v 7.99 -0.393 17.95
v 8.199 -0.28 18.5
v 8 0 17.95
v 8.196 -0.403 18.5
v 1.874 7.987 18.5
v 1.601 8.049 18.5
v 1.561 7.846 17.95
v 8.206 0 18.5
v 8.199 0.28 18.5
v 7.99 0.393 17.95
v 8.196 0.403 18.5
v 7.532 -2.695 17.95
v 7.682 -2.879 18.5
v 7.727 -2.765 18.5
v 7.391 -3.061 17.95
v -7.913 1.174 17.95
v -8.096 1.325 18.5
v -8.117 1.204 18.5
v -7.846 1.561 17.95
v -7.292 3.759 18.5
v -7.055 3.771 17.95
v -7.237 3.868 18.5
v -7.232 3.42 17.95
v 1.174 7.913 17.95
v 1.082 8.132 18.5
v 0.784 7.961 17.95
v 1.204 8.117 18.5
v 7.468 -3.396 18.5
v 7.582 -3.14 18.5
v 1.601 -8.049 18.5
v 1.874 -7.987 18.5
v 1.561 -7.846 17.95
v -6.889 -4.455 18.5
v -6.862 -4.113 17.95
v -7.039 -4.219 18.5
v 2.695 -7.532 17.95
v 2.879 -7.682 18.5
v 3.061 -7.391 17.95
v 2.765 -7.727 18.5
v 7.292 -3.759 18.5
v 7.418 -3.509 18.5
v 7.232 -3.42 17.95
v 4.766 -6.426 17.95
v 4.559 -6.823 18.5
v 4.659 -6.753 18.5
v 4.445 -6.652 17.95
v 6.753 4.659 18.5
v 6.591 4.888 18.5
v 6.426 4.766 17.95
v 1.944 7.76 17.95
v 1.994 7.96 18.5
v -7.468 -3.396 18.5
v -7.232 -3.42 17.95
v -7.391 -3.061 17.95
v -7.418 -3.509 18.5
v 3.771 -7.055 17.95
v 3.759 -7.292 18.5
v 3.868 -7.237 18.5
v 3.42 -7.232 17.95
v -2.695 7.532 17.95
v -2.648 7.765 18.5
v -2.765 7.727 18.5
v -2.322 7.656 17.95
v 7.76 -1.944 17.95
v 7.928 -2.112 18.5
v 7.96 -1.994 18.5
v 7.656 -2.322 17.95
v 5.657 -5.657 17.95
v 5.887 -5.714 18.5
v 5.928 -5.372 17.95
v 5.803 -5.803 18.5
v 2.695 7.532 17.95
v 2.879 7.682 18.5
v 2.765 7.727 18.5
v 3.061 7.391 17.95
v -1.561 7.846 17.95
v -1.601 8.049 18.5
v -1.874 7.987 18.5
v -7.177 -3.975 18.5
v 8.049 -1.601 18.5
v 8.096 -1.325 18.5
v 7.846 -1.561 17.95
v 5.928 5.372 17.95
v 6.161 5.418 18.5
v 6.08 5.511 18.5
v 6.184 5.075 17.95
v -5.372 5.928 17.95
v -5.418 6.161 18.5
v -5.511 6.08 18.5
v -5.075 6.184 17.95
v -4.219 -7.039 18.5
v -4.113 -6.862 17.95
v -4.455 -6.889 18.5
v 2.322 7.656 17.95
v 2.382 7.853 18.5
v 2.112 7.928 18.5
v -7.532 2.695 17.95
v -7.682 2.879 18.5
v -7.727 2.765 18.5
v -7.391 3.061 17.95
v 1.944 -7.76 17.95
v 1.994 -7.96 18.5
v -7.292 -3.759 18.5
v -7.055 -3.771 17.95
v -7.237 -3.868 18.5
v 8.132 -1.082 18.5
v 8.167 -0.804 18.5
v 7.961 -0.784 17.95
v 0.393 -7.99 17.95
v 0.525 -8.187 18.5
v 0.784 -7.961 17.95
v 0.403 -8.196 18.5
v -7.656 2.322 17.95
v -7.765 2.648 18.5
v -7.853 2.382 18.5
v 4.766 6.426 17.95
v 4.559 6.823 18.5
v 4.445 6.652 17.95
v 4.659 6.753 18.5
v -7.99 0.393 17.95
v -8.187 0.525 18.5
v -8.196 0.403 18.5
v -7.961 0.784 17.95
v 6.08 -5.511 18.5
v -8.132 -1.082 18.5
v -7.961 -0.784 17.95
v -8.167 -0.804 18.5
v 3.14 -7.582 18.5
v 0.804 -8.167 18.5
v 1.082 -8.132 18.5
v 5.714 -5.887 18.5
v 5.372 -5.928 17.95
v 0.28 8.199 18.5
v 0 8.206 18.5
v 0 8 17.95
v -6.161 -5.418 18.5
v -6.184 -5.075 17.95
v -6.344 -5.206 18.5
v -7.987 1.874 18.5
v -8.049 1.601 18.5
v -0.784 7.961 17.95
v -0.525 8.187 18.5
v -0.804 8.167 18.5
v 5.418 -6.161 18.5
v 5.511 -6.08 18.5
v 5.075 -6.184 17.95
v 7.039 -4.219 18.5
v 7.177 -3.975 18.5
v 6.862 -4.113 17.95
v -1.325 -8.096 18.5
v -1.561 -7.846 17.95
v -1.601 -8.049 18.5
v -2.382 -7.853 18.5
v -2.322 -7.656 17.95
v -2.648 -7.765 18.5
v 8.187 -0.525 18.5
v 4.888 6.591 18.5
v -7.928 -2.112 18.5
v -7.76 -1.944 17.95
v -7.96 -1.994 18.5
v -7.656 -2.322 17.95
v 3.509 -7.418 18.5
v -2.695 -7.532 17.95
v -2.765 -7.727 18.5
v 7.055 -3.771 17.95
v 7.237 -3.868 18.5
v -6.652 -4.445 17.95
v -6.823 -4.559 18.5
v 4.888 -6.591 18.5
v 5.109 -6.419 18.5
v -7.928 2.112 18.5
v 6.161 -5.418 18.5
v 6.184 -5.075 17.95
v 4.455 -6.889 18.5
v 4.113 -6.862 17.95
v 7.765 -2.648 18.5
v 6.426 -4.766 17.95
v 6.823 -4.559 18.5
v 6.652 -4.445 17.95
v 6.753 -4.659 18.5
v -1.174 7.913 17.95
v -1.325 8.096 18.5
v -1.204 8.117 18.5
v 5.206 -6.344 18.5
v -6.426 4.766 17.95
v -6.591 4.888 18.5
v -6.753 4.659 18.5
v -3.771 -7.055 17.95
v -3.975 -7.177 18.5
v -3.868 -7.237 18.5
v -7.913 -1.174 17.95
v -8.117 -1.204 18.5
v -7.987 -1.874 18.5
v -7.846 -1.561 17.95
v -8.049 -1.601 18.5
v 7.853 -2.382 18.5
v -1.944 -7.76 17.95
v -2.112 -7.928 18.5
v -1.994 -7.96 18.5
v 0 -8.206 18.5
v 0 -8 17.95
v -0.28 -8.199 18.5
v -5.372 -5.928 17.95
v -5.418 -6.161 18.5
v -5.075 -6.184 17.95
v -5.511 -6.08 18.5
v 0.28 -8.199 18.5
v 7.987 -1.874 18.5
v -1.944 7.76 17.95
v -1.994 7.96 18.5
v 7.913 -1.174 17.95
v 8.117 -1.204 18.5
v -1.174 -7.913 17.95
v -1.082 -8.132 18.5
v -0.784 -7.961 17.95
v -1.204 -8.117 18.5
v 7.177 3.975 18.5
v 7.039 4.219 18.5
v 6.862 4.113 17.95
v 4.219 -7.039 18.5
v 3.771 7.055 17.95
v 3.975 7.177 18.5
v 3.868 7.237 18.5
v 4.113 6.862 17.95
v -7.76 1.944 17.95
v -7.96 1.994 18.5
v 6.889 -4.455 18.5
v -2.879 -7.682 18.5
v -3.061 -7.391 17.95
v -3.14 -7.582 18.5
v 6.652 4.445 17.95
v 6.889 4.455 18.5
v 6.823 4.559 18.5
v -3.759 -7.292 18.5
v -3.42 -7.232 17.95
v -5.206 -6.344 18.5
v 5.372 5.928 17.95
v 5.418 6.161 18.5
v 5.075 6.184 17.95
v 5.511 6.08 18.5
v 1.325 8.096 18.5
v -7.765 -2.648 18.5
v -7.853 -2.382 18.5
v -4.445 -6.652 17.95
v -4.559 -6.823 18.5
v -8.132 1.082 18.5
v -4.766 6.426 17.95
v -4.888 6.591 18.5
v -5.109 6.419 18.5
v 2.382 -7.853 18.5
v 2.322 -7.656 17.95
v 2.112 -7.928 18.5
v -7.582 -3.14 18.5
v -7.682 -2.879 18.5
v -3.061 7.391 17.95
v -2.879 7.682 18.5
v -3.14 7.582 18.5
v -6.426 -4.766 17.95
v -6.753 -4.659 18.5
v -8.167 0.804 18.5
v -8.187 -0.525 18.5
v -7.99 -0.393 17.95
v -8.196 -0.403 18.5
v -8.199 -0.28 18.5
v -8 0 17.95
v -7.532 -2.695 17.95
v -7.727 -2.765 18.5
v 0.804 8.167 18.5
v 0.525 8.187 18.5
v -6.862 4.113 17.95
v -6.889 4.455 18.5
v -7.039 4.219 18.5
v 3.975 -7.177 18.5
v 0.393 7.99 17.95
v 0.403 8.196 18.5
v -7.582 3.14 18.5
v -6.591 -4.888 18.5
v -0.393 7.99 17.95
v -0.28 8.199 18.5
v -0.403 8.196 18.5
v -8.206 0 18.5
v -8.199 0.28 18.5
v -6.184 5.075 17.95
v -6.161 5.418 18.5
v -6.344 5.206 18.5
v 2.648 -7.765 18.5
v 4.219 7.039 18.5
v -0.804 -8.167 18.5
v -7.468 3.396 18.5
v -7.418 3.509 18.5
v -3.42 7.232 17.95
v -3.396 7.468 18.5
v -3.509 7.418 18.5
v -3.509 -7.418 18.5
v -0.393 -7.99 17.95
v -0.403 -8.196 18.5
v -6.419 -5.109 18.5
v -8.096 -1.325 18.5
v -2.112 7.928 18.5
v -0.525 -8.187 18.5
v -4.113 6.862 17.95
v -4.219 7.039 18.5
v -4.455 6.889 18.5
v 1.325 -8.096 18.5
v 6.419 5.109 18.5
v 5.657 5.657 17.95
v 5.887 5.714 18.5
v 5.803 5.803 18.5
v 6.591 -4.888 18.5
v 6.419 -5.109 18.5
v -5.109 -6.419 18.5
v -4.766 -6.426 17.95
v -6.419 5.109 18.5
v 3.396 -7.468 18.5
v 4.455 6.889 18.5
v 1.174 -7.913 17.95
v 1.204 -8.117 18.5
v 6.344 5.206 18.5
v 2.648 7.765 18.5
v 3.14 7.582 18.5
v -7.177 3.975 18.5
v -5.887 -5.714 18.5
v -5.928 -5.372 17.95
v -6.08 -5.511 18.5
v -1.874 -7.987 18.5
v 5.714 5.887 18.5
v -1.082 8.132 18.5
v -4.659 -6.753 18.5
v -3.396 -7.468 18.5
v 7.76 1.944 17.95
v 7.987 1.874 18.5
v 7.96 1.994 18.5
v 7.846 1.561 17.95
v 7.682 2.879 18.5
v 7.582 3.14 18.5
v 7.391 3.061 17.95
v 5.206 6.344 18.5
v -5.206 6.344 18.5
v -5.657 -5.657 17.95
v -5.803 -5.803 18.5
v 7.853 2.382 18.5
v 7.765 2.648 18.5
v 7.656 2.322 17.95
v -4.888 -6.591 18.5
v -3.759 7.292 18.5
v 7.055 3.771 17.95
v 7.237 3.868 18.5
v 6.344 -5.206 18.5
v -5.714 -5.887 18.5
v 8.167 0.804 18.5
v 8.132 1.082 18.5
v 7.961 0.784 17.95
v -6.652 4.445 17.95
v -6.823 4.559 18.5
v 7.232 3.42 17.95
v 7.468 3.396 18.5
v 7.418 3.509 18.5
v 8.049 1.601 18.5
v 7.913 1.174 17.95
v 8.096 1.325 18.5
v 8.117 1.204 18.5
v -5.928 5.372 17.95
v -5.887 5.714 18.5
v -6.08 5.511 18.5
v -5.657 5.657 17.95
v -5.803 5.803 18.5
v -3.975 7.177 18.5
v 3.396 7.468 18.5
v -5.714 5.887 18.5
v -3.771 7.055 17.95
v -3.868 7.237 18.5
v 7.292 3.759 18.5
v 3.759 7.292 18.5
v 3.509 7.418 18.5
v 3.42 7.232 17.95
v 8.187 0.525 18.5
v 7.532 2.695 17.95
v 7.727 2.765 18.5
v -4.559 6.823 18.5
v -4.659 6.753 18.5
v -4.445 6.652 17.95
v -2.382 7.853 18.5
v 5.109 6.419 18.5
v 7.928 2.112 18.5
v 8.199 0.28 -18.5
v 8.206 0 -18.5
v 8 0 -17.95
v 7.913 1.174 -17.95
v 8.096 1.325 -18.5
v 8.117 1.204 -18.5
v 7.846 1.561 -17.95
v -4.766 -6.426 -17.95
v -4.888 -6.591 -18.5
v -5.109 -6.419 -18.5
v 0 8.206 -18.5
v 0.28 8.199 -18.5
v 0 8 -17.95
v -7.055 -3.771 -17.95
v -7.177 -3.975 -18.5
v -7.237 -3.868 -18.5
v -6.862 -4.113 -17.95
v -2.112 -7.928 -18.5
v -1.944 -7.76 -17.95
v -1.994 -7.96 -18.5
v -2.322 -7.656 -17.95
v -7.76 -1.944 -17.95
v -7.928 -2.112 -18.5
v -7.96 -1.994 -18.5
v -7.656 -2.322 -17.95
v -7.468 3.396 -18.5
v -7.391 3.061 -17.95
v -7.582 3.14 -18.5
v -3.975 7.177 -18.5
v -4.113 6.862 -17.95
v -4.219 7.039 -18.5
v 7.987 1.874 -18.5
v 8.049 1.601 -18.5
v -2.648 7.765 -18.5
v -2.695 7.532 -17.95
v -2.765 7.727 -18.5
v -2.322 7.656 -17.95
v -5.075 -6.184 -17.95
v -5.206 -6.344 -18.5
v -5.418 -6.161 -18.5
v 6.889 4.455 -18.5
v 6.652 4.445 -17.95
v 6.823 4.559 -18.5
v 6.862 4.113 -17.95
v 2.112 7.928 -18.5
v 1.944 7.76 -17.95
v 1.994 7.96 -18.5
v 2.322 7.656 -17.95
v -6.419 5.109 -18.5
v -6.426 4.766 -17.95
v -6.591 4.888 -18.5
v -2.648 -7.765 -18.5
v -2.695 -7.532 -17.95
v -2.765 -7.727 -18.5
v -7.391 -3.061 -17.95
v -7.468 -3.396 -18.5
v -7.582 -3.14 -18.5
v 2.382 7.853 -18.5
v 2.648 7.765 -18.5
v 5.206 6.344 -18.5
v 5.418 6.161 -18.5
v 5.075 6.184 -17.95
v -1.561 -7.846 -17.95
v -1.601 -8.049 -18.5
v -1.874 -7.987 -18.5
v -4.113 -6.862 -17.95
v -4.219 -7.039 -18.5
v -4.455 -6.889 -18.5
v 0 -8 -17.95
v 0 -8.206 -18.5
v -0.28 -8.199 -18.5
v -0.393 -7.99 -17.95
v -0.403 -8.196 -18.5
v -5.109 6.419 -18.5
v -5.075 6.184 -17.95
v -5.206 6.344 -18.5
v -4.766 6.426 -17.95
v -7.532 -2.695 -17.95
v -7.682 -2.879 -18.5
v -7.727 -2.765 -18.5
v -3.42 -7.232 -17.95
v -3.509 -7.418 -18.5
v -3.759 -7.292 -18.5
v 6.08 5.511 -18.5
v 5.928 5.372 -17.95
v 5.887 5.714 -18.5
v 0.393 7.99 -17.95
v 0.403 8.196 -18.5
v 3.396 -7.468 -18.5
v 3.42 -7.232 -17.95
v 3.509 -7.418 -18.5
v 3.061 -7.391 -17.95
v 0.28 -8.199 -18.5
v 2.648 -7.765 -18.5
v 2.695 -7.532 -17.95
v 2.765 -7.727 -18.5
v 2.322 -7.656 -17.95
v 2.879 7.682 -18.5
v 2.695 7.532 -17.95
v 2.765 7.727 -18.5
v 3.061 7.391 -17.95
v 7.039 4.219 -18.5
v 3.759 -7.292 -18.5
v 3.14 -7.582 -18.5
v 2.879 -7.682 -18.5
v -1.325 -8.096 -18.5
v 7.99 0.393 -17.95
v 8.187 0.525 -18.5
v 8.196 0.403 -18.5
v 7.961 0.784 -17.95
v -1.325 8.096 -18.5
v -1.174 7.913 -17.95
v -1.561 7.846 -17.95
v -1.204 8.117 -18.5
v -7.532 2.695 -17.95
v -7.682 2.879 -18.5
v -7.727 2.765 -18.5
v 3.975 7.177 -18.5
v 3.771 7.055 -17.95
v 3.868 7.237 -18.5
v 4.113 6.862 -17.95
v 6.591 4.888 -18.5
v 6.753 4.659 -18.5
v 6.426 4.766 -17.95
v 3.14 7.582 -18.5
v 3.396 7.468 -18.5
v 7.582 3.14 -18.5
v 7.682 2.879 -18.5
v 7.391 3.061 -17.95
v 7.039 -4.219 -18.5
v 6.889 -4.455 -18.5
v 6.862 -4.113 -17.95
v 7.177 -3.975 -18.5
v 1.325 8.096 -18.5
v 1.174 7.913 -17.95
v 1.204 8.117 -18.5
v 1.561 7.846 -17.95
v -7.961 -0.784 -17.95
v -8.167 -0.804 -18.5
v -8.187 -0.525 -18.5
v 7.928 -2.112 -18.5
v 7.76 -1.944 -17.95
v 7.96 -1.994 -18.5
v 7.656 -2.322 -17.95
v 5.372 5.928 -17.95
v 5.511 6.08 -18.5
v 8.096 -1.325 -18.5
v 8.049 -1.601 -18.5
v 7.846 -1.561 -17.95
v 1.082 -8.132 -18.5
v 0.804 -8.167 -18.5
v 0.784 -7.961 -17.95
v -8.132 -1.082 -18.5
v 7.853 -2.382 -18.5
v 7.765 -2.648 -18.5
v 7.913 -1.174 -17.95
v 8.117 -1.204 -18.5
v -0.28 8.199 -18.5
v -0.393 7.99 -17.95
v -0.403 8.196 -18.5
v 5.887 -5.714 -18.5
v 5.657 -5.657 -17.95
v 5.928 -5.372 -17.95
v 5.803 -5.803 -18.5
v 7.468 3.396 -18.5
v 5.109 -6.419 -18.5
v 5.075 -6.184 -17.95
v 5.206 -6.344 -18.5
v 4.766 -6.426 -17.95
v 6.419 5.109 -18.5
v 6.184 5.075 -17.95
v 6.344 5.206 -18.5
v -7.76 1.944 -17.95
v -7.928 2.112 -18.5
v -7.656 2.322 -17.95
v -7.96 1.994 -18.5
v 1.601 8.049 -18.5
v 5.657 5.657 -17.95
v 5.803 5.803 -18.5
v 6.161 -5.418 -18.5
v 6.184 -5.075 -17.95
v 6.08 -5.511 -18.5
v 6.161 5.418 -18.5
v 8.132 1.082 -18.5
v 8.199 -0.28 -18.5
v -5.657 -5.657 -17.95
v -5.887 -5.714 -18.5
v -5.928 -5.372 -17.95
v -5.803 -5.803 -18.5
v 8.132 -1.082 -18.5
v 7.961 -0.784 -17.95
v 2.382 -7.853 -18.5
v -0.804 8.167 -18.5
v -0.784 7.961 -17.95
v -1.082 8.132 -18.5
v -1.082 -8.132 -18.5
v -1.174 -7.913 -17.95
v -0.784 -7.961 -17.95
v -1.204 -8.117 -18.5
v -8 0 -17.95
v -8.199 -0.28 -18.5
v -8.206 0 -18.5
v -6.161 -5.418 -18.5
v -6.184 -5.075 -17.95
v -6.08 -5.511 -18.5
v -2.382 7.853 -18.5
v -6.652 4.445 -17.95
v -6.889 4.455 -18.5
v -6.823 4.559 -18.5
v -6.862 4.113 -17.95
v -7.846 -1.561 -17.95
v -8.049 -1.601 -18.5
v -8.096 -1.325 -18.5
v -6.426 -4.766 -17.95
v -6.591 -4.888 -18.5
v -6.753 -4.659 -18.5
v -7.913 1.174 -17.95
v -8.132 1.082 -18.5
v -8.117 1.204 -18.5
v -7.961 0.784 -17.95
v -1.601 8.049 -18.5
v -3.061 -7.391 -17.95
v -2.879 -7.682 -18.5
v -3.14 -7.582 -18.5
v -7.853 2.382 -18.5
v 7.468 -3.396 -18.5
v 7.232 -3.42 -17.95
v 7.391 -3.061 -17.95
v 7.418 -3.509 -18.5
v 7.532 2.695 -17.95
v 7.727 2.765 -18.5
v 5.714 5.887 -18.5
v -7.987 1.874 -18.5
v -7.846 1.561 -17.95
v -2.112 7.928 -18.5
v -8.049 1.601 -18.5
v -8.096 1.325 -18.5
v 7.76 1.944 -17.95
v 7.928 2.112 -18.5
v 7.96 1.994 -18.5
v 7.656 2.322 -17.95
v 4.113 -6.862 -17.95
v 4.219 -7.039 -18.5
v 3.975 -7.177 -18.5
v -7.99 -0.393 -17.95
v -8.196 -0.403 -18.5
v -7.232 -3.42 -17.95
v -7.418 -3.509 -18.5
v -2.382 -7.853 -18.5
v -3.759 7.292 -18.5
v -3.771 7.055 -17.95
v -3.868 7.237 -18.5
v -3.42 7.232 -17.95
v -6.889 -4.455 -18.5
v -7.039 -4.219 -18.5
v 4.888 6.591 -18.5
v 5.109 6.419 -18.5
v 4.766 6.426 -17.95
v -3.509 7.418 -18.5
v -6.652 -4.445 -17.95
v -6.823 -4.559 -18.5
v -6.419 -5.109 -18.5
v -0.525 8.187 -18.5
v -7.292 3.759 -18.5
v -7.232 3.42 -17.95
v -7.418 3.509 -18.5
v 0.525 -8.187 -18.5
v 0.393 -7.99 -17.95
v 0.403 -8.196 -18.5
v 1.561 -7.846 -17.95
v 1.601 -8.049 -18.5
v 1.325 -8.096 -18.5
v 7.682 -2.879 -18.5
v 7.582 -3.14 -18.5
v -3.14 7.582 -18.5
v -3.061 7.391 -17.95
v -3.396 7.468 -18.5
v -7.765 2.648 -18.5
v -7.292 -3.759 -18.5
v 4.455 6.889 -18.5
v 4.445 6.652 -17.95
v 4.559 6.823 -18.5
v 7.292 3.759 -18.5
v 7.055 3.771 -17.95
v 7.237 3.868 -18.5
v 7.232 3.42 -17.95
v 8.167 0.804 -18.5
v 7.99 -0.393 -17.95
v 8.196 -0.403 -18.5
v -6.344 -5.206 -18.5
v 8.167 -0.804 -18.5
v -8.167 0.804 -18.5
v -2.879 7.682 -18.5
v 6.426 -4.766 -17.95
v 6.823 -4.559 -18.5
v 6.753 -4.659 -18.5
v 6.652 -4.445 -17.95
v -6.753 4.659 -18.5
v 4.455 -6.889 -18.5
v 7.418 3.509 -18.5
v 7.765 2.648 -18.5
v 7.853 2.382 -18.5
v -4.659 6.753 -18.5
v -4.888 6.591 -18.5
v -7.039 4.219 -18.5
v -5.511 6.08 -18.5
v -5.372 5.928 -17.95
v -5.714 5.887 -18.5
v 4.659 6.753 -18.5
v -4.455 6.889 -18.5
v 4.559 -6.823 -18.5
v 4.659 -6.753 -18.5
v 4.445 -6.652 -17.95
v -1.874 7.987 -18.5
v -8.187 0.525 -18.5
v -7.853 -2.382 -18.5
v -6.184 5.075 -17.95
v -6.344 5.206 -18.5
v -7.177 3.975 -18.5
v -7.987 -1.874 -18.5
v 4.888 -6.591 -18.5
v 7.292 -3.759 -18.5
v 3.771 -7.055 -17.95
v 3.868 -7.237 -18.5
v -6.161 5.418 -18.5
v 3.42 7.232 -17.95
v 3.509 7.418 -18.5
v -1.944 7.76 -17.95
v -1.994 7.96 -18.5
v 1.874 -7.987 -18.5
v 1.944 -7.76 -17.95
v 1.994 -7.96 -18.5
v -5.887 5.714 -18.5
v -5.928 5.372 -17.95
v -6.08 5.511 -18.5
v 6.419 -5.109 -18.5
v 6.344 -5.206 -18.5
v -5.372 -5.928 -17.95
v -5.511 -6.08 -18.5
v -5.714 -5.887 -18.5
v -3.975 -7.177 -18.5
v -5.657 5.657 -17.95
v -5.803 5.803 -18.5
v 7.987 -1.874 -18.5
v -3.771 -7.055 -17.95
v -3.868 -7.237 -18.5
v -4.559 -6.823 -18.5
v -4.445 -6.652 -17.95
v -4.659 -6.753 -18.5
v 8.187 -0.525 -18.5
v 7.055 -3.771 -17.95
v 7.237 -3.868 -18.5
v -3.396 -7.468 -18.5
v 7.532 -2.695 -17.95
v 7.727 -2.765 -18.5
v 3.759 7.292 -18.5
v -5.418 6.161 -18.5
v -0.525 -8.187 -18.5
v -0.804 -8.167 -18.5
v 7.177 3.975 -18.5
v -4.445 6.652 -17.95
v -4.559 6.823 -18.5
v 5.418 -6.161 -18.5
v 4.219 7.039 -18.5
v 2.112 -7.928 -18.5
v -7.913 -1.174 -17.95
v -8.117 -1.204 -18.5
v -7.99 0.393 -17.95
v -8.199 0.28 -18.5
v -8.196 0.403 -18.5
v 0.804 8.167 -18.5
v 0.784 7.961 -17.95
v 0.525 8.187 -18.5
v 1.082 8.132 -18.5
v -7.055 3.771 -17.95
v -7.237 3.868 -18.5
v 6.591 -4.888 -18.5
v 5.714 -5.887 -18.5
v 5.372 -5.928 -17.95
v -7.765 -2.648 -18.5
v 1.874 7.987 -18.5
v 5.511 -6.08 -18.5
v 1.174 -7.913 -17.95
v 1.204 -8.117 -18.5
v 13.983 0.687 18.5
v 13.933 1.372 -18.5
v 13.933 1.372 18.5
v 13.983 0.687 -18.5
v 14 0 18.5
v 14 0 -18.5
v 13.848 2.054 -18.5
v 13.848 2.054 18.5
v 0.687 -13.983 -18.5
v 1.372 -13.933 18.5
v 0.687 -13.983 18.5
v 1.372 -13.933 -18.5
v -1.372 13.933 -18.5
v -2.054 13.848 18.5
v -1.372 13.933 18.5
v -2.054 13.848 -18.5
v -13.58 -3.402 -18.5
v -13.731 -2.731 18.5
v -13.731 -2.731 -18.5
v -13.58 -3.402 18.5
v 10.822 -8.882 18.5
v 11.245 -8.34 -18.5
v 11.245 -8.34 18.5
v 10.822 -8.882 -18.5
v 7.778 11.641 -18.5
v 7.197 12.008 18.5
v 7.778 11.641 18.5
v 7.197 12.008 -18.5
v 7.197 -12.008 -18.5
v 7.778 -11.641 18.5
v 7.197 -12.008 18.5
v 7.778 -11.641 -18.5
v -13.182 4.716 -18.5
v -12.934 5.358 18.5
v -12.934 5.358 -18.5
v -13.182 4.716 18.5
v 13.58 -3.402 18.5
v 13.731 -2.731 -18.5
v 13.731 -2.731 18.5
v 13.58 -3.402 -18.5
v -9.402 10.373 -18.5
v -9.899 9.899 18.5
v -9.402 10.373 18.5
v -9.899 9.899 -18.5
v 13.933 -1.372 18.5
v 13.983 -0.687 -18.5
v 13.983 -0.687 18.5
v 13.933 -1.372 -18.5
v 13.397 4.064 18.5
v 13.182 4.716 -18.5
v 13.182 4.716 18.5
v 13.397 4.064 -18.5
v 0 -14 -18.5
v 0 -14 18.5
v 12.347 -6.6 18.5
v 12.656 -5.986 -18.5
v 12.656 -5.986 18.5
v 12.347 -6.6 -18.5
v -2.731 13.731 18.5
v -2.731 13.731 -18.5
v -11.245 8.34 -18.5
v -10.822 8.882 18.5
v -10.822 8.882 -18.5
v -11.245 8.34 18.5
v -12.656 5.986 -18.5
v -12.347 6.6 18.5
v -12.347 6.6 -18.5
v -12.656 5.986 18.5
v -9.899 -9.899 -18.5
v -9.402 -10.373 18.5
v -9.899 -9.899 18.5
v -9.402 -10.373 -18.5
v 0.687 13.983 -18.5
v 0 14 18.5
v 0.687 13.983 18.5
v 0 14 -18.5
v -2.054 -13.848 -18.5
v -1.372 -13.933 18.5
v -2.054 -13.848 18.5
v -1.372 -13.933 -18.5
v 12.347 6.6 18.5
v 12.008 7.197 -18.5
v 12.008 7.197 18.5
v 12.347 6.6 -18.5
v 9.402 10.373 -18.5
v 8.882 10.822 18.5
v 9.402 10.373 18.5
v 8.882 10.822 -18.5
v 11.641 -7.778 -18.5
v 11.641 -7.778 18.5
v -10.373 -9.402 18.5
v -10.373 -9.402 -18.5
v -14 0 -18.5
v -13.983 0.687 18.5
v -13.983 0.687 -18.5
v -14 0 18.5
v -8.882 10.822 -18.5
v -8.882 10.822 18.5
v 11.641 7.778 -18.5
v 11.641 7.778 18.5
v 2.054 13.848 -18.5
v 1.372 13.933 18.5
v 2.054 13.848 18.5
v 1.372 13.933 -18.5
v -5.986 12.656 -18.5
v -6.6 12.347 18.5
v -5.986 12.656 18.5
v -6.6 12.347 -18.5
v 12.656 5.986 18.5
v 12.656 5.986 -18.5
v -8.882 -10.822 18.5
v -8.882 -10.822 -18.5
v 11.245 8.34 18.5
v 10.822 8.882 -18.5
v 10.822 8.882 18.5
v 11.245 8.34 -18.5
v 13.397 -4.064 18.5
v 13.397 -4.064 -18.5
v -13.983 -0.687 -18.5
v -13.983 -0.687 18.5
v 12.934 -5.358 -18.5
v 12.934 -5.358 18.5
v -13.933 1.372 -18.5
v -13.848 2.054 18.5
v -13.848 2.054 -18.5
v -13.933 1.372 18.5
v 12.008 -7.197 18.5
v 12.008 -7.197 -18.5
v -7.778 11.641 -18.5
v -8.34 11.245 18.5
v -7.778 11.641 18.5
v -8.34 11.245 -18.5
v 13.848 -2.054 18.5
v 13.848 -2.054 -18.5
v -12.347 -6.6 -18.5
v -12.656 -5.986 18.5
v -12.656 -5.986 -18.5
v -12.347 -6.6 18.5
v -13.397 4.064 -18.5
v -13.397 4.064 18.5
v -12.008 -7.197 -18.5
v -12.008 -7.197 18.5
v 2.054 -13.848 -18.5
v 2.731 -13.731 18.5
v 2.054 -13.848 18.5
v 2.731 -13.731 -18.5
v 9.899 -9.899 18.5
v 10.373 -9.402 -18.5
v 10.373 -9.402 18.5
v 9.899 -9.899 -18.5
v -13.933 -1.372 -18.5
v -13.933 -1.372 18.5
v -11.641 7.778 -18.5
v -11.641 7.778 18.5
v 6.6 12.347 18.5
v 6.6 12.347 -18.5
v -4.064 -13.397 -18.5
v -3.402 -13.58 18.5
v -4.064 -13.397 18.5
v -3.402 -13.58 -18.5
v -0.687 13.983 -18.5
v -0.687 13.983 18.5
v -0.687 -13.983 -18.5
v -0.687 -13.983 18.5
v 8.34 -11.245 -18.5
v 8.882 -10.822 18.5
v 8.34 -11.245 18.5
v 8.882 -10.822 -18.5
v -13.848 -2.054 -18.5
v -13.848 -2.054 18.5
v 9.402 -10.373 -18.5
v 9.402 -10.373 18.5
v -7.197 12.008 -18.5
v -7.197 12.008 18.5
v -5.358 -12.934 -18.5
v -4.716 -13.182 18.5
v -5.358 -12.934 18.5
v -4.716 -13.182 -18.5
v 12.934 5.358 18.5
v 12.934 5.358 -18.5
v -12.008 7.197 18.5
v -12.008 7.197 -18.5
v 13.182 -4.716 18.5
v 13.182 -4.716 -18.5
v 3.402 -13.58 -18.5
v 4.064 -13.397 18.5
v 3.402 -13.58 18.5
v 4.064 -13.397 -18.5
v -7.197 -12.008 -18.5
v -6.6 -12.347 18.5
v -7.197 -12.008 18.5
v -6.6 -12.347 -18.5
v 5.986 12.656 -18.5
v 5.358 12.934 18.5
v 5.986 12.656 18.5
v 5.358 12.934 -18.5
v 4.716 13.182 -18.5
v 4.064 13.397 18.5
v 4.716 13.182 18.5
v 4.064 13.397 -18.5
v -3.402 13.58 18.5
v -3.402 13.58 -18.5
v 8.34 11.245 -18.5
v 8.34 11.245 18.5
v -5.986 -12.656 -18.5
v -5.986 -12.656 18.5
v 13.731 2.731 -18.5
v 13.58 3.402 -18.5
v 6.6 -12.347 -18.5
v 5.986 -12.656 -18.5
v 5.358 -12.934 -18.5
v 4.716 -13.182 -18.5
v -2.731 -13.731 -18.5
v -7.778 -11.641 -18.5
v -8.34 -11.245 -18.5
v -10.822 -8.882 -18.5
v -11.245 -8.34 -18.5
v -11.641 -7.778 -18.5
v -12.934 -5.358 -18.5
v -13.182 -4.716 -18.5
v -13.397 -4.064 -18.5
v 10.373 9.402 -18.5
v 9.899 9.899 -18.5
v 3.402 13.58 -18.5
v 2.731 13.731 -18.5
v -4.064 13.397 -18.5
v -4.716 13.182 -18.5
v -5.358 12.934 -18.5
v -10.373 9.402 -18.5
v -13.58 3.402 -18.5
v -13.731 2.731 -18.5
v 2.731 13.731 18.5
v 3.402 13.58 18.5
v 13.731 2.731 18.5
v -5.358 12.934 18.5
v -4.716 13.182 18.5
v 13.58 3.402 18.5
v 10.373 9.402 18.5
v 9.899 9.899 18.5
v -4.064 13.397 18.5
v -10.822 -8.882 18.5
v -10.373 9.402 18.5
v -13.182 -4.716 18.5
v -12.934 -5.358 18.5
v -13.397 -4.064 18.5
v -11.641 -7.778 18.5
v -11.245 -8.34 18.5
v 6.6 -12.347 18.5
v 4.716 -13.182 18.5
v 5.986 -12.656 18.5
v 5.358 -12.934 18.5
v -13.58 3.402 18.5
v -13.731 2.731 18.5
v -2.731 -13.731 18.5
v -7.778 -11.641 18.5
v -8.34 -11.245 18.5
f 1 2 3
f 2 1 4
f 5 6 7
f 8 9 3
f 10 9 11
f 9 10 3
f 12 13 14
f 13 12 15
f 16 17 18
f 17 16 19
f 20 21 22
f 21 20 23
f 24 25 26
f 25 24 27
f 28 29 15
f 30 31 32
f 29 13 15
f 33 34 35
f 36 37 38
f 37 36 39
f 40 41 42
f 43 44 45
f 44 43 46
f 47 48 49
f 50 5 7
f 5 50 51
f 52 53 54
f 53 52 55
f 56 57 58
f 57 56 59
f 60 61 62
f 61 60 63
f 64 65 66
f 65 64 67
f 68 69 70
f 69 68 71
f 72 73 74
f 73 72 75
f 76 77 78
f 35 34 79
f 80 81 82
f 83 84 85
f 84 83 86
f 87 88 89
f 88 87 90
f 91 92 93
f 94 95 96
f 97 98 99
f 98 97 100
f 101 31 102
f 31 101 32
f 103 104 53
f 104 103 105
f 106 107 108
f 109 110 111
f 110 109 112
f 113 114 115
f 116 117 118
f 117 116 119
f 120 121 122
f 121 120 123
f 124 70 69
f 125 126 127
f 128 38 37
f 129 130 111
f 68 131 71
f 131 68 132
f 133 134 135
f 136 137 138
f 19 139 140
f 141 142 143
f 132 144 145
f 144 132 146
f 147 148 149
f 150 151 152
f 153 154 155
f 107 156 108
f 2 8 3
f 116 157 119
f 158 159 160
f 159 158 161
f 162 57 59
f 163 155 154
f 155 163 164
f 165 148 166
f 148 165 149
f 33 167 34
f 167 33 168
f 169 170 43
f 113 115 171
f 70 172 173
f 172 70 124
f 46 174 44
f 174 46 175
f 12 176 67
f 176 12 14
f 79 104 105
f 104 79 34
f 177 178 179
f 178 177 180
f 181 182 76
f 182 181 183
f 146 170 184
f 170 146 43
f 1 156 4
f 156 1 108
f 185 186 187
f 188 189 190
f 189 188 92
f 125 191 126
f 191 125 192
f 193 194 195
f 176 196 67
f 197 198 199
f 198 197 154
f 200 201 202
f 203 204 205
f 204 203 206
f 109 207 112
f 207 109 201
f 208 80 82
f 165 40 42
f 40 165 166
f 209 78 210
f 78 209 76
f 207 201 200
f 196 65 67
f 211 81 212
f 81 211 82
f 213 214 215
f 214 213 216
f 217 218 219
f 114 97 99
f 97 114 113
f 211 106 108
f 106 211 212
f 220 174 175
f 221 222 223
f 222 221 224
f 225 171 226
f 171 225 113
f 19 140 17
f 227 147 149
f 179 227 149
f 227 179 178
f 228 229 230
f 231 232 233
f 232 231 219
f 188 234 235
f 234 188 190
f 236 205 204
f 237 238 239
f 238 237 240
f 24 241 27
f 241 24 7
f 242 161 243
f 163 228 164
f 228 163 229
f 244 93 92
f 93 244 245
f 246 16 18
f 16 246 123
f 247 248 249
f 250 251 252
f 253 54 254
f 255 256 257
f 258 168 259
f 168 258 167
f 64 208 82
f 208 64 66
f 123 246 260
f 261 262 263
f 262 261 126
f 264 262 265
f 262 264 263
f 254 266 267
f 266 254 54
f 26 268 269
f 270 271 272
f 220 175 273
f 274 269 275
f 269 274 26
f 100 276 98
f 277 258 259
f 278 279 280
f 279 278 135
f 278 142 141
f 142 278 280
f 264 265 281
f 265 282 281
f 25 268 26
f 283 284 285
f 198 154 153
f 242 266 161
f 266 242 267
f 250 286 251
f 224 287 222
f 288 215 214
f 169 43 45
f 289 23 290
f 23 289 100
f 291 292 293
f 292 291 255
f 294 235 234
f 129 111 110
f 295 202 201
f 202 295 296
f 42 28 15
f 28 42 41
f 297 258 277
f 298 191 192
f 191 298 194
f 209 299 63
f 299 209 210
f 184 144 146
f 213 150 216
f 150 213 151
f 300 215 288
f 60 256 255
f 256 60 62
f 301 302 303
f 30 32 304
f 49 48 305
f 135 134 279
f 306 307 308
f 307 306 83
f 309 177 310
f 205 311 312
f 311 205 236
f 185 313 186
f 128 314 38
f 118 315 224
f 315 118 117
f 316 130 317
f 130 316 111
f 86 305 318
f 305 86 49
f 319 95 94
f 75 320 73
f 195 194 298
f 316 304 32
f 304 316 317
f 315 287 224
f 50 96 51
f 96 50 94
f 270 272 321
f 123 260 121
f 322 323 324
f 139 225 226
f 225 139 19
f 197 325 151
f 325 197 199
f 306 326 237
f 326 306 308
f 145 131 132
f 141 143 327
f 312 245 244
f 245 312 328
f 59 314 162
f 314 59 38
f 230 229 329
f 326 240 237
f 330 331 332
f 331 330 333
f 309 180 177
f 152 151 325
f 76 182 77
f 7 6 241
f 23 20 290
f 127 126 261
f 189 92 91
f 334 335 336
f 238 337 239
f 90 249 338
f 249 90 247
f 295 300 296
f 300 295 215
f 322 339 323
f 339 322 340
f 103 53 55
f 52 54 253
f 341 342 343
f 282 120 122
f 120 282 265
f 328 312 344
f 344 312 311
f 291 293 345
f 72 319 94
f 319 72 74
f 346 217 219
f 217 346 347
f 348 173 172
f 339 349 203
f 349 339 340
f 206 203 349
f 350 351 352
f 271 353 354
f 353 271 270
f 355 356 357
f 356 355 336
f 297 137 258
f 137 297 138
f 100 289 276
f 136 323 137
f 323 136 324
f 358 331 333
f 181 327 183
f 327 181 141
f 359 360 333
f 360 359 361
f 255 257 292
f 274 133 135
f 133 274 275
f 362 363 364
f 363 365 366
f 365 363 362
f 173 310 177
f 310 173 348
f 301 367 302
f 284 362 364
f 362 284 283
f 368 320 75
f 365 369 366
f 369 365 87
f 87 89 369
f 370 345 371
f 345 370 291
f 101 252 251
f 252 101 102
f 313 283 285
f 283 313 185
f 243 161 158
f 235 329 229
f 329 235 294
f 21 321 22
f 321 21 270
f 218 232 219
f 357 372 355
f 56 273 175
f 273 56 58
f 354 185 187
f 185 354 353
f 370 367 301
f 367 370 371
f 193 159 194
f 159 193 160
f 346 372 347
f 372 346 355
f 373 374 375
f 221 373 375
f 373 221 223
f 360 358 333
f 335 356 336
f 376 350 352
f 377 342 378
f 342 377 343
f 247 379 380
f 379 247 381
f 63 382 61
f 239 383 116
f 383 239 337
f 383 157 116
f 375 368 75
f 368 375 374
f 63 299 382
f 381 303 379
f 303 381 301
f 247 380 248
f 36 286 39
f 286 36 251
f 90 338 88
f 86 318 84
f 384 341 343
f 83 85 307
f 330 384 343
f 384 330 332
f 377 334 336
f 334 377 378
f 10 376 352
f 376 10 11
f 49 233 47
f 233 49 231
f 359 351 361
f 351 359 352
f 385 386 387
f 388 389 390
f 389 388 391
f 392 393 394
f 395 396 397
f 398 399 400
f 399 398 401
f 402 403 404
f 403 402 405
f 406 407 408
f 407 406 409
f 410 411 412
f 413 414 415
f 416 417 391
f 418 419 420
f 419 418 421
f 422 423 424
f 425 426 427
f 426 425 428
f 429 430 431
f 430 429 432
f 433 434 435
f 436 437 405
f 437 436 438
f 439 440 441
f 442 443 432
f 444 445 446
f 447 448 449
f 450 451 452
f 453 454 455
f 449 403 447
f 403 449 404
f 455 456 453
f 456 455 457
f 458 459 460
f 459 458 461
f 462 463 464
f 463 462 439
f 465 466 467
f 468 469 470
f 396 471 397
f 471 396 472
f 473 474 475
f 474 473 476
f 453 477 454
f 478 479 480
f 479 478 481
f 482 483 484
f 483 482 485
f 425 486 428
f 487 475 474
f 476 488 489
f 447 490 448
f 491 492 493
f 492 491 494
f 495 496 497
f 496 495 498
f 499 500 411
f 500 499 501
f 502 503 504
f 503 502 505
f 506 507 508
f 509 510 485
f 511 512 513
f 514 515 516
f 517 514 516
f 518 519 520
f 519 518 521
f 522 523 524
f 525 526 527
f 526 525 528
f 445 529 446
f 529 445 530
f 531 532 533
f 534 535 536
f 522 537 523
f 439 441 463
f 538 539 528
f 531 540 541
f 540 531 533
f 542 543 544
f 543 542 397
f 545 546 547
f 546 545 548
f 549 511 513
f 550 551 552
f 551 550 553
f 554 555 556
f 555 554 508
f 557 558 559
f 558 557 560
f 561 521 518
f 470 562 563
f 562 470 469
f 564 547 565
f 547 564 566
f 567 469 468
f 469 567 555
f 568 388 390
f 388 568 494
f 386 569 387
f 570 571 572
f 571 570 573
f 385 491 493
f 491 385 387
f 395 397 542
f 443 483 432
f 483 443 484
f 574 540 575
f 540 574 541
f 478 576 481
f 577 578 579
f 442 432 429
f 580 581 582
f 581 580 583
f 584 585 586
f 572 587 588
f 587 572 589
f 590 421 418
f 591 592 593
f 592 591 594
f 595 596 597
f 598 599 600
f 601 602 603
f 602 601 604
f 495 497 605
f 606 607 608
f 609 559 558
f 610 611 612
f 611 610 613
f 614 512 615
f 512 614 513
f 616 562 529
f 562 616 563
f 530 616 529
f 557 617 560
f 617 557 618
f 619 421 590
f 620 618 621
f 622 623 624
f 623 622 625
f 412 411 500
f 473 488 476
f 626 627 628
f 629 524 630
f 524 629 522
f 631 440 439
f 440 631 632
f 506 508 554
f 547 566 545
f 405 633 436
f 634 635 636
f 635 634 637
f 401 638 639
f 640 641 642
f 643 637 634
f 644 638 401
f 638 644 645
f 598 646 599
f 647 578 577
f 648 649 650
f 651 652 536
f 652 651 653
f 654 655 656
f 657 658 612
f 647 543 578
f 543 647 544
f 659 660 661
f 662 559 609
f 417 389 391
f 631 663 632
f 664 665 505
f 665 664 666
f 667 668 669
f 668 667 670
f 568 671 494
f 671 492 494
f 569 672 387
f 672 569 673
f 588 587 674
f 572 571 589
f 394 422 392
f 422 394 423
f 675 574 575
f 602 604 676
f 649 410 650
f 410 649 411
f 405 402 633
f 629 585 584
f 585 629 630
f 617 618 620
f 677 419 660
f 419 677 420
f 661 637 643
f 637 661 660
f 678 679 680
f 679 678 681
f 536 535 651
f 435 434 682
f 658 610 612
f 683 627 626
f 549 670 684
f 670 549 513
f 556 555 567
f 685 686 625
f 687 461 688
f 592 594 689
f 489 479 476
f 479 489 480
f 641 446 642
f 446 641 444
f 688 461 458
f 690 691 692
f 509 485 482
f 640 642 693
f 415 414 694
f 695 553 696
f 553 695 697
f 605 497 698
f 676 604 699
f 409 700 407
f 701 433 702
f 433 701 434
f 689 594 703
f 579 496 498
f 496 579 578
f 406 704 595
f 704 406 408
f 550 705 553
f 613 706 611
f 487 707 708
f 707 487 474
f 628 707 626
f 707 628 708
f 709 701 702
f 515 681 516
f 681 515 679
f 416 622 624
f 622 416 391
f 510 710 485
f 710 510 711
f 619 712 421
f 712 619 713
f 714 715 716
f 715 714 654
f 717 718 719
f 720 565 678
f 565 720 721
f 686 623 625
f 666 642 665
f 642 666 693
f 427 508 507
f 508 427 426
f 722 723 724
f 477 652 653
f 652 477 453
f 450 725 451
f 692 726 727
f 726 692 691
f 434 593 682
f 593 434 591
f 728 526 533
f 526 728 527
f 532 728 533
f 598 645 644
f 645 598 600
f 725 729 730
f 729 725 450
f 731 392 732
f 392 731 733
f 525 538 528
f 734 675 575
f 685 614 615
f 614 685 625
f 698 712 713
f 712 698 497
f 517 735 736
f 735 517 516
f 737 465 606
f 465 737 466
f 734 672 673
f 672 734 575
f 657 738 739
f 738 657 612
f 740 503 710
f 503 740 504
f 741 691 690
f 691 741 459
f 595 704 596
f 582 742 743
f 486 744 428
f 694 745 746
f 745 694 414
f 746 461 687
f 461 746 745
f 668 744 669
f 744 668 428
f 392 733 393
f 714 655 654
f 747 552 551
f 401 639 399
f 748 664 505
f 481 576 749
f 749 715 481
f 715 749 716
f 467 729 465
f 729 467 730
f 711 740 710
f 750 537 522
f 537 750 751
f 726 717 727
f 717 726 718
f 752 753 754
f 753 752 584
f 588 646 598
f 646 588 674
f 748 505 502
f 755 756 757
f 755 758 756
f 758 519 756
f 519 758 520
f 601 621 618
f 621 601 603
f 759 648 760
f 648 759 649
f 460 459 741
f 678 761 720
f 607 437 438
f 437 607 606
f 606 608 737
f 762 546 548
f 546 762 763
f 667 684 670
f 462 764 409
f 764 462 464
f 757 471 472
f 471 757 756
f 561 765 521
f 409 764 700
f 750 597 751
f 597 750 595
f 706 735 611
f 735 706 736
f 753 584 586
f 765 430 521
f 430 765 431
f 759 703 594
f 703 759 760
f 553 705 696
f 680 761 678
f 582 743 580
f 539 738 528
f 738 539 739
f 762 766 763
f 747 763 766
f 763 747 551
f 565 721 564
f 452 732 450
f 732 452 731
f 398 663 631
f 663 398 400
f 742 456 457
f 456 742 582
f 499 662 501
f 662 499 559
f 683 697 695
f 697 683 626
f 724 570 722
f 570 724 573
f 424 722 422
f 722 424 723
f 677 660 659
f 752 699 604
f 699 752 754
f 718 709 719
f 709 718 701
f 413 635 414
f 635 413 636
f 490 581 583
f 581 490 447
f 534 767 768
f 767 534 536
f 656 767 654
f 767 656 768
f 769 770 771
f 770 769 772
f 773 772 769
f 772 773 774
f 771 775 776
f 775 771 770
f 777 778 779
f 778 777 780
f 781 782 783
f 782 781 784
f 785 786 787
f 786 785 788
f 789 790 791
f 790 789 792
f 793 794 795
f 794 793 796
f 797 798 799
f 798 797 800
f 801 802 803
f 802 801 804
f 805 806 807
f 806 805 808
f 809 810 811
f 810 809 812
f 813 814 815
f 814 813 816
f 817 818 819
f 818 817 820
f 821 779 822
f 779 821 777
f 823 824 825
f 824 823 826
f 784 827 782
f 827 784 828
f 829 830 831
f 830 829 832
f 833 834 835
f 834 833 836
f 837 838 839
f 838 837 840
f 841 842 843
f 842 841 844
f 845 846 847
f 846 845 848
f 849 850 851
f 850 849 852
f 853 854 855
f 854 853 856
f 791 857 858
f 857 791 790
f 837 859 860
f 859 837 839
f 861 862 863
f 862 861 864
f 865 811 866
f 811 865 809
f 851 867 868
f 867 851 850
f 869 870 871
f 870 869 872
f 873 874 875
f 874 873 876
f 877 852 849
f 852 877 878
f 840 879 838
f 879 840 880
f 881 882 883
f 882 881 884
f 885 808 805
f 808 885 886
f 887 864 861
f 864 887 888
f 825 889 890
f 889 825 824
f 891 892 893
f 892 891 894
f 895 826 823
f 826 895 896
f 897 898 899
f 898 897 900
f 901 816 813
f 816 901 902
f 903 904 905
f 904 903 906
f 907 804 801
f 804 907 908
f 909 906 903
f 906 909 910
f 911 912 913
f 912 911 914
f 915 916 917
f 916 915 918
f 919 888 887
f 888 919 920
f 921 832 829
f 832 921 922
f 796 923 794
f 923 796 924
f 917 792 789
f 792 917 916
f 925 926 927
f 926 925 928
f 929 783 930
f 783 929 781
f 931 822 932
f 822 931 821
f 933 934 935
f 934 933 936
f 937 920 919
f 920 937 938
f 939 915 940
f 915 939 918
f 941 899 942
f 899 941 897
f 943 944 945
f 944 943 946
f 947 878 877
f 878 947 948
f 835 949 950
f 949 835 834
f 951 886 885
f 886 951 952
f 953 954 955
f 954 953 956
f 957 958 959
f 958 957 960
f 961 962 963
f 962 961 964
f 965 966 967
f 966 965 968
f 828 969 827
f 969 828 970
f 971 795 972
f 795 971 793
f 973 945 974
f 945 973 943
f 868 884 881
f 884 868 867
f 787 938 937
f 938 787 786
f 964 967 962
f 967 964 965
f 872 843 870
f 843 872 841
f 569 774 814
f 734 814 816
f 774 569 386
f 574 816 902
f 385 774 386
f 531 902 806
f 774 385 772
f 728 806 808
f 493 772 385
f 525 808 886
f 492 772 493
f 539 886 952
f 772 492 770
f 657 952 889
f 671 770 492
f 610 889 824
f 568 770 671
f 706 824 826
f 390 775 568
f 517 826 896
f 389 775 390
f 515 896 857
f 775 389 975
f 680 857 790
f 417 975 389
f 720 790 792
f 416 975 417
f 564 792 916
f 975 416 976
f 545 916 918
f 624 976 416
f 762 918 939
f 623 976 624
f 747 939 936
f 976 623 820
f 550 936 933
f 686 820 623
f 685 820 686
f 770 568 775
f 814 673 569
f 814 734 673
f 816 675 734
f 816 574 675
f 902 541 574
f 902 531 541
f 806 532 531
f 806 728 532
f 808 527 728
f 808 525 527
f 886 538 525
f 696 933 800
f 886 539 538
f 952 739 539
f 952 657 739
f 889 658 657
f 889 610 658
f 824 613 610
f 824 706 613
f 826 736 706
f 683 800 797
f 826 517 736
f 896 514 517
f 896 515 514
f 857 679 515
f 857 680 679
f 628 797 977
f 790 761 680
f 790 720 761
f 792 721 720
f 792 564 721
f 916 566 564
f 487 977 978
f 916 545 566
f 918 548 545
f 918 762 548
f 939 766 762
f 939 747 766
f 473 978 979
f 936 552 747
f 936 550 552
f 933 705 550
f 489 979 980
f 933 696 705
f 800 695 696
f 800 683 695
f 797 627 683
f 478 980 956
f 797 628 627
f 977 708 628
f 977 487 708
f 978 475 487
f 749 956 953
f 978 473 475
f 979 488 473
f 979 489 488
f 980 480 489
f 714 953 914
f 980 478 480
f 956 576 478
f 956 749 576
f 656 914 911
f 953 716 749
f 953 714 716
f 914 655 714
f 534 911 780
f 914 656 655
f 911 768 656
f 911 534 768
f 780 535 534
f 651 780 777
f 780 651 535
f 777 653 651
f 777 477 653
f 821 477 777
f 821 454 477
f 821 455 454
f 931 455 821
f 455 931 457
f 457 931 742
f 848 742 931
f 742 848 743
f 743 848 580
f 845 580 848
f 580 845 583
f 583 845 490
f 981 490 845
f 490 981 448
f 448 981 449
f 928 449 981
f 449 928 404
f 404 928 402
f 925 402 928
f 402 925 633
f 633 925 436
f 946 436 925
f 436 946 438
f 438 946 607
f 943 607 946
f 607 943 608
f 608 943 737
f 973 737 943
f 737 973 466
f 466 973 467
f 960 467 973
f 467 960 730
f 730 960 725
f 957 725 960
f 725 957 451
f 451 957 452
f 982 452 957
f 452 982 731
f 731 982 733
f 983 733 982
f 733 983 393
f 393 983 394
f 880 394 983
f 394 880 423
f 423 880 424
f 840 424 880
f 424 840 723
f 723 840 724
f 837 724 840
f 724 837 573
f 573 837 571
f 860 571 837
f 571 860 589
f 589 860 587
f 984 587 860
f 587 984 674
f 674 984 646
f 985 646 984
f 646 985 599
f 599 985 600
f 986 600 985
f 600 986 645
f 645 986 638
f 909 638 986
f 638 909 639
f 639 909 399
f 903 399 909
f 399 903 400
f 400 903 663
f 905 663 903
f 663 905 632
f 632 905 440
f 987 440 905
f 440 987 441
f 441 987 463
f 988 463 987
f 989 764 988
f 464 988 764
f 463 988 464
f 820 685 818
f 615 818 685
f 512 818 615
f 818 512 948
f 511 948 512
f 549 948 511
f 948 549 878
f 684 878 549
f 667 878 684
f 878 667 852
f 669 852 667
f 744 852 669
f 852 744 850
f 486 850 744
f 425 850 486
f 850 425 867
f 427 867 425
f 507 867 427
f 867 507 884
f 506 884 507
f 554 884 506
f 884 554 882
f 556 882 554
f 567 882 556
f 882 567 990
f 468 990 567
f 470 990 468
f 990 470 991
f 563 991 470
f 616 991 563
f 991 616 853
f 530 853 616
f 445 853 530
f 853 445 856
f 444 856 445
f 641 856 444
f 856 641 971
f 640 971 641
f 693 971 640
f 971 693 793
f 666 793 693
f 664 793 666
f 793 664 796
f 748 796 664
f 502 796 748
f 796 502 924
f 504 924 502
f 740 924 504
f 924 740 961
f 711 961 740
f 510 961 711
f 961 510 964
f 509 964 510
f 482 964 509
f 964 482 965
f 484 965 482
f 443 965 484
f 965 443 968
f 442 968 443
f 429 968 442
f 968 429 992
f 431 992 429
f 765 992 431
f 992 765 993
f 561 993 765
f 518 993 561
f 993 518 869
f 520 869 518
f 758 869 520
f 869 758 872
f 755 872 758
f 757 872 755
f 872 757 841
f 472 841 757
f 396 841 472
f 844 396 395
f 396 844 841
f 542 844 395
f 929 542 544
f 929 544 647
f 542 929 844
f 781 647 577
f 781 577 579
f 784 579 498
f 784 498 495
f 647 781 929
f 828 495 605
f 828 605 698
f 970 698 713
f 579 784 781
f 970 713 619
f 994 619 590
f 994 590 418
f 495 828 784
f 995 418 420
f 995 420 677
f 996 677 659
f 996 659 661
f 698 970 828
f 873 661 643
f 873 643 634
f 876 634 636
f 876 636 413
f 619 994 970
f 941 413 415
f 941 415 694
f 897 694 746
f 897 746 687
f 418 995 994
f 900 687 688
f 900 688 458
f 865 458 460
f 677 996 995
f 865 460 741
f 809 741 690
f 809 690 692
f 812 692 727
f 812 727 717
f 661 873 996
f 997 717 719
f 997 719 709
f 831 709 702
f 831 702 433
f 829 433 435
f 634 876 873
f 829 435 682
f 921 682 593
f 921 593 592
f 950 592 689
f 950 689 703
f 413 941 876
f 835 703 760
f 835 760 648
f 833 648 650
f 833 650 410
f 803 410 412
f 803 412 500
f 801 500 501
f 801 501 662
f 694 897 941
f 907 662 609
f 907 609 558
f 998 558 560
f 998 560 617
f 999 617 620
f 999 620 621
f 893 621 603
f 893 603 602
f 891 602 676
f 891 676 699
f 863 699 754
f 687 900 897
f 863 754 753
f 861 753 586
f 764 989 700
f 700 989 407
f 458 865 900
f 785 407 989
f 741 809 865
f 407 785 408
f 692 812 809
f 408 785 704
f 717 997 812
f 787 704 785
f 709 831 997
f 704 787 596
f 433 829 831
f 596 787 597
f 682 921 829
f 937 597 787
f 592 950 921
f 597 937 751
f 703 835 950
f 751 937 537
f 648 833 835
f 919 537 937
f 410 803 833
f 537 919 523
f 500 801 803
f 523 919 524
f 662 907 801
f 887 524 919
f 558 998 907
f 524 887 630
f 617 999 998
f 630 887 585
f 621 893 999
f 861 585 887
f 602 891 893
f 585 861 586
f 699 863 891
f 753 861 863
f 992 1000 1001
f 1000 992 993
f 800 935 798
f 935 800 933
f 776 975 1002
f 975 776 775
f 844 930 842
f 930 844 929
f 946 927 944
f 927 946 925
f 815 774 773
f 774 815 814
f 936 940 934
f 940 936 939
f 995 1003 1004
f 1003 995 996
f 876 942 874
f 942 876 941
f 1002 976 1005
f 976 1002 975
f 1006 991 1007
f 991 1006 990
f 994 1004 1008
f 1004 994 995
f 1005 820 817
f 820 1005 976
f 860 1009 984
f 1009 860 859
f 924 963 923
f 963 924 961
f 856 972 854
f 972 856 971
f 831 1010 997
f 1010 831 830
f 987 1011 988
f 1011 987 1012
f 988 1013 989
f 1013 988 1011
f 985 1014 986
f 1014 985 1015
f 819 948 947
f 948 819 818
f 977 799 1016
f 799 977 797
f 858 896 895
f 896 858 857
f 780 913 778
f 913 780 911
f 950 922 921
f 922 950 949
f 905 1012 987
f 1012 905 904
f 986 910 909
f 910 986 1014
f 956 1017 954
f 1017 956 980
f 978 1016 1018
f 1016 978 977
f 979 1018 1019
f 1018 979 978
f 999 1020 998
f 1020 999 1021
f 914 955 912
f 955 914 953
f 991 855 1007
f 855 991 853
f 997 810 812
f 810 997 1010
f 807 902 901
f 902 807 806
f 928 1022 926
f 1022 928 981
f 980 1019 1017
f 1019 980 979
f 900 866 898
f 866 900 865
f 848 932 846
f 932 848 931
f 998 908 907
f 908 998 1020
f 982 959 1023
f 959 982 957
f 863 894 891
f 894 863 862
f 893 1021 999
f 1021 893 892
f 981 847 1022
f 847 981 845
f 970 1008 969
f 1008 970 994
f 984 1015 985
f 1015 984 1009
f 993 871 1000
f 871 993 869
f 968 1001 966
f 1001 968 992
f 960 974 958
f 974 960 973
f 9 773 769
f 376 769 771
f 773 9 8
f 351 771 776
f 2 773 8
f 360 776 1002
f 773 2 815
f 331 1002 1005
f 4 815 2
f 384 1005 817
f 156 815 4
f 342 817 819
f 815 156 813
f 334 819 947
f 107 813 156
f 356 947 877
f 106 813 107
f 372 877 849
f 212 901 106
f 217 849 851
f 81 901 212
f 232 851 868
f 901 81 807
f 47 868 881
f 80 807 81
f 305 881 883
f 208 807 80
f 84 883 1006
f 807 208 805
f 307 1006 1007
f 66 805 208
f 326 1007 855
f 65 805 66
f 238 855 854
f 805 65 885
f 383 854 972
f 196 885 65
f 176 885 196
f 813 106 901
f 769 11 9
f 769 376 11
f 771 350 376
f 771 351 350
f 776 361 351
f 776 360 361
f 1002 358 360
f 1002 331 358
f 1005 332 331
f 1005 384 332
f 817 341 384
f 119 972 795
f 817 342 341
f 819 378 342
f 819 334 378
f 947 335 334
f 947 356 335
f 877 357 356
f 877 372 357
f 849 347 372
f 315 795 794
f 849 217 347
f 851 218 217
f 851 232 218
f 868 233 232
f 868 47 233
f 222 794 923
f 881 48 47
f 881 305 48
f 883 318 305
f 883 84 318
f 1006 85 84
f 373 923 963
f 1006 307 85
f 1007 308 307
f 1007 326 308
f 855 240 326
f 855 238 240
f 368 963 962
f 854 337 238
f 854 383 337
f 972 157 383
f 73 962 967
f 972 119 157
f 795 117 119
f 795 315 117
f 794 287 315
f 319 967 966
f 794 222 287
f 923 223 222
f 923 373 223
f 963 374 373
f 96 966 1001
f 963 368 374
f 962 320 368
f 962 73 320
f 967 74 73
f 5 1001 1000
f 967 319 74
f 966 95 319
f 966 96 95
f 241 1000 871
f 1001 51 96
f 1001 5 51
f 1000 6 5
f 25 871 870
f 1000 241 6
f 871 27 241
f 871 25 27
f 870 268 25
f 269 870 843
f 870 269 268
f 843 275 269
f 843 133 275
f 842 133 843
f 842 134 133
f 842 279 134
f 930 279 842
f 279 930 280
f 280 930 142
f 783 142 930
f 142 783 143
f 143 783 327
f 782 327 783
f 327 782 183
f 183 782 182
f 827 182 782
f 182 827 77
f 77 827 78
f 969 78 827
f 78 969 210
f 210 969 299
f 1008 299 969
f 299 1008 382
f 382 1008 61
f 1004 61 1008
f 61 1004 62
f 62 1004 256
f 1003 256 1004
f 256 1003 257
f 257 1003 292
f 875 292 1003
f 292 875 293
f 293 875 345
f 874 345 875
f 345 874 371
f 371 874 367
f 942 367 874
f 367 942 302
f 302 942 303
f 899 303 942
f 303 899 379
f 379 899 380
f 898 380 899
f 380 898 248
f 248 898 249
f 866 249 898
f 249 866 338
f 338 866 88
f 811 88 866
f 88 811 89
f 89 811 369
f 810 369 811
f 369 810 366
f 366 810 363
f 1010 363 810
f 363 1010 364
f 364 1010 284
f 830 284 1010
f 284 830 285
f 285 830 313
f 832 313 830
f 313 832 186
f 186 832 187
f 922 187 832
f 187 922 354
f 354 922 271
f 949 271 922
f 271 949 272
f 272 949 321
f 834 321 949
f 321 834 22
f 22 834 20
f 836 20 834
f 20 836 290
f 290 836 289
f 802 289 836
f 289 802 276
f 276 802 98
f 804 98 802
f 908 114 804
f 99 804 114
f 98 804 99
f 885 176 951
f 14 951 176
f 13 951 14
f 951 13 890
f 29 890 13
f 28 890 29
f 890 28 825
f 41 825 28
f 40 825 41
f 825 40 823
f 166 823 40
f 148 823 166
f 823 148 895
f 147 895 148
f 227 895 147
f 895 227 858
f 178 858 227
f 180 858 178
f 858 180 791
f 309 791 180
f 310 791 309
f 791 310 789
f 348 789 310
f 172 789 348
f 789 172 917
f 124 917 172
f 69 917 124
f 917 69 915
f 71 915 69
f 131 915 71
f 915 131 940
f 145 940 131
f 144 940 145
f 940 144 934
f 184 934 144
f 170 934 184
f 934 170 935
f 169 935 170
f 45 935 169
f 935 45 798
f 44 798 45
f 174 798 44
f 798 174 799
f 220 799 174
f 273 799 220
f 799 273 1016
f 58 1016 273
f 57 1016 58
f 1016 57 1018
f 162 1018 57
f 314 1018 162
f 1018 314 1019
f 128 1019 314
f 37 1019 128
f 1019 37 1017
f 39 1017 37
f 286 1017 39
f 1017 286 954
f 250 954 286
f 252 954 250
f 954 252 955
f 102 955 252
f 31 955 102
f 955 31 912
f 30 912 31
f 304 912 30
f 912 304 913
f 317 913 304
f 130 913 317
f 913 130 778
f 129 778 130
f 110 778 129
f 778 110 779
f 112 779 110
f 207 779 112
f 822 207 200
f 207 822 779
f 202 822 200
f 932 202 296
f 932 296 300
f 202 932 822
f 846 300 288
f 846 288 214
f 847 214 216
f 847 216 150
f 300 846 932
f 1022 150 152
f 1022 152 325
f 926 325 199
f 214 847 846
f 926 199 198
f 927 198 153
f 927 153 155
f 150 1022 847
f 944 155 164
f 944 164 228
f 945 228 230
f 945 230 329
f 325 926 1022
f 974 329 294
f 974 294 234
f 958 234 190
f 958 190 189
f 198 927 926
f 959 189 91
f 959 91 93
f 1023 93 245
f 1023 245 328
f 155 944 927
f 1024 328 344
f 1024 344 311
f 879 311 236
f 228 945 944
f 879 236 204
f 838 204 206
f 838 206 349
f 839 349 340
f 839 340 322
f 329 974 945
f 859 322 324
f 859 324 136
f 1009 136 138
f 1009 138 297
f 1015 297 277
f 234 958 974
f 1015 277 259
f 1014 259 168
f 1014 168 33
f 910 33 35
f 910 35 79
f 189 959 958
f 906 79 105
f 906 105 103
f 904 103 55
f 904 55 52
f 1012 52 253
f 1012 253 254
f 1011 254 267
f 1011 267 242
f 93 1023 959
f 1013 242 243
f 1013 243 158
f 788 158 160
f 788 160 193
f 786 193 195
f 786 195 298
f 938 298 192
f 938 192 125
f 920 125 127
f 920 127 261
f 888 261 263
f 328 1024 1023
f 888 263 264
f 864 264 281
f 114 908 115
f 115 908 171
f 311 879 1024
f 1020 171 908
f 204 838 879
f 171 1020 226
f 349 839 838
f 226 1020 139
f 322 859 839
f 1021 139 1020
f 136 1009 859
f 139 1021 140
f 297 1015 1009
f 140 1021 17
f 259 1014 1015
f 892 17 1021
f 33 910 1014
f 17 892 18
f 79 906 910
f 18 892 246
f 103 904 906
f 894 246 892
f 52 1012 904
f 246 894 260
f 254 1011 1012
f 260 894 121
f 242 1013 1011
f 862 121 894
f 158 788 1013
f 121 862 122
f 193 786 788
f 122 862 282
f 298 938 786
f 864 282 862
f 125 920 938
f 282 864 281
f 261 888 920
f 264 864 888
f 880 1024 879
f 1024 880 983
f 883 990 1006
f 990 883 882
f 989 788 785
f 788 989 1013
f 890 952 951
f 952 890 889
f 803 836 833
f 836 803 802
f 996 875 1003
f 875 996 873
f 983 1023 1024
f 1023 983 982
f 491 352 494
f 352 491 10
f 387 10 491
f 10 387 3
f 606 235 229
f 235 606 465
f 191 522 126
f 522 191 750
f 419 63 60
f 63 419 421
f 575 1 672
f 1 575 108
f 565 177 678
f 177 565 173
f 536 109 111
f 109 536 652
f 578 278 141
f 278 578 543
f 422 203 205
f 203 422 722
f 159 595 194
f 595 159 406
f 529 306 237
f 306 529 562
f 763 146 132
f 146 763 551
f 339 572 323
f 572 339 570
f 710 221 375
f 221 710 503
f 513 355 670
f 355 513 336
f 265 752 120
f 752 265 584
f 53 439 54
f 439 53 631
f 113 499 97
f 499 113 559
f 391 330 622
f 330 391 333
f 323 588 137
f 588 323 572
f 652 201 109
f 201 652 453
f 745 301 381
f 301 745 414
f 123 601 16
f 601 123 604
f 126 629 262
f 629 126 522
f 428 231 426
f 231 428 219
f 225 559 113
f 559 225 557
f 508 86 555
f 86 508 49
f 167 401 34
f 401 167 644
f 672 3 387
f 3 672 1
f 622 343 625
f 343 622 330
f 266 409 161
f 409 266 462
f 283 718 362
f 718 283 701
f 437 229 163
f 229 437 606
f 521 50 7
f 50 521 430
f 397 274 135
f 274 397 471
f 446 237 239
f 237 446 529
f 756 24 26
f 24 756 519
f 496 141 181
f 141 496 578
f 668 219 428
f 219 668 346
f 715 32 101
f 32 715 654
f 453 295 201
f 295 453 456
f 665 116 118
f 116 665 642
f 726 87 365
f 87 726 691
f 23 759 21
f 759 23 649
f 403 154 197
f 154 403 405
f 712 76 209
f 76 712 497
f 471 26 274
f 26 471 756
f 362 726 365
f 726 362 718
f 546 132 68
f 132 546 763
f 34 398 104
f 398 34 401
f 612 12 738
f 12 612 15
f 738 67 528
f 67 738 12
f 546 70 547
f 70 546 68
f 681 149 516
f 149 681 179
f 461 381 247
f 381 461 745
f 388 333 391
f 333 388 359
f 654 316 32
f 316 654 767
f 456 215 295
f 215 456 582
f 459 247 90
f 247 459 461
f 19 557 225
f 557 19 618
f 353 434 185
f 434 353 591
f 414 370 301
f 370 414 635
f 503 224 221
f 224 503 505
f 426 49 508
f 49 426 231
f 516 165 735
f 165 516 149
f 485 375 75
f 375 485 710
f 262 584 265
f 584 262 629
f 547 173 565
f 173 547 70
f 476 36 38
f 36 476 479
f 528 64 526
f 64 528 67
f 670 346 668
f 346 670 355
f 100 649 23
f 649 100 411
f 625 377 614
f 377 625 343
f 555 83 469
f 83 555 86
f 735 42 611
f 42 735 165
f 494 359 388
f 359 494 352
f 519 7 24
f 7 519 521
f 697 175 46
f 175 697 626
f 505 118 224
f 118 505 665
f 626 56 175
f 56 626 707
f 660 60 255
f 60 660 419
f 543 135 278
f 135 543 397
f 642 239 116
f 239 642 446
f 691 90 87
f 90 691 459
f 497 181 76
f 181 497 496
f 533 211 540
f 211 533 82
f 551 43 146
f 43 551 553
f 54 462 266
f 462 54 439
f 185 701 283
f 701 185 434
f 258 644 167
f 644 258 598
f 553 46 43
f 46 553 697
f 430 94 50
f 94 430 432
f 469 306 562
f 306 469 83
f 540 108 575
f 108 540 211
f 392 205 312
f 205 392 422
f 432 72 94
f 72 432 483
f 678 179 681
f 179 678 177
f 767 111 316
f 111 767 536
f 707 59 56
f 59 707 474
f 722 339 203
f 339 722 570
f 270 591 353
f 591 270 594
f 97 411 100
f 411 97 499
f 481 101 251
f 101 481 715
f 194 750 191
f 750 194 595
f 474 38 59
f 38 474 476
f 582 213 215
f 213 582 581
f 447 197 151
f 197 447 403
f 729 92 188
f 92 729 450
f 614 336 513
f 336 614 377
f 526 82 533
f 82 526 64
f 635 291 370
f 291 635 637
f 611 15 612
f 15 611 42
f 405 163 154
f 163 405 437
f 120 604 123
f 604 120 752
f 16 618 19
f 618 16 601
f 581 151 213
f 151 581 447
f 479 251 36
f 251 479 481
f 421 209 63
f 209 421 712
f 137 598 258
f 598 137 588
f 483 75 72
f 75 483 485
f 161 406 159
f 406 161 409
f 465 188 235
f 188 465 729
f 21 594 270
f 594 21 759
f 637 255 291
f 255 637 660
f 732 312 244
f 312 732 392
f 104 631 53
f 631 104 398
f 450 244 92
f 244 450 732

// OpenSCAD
// Linear bearing sleeve (plain envelope)
// Critical dimensions:
// - Bore:   16.0 mm
// - OD:     28.0 mm
// - Length: 37.0 mm
// One connected solid, no external grooves/reliefs.

$fn = 128;

// Parameters
bore_d  = 16.0;
outer_d = 28.0;
length  = 37.0;

// Small edge break (kept subtle; does not change critical dims)
edge_chamfer = 0.3;   // mm
overlap      = 0.5;   // mm (robust boolean)

// Derived
outer_r = outer_d/2;
bore_r  = bore_d/2;

// Base solids
module outer_body() {
    cylinder(h=length, r=outer_r, center=true);
}

module bore_cut() {
    cylinder(h=length + 2*overlap, r=bore_r, center=true);
}

// Internal edge chamfers only (keeps OD and length exact)
module inner_edge_chamfers() {
    // Clamp chamfer so it can't exceed wall thickness
    ch = min(edge_chamfer, max(0, (outer_r - bore_r) - 0.05));

    if (ch > 0) {
        // Top inner chamfer
        translate([0, 0, length/2 - ch/2])
            cylinder(h=ch + overlap,
                     r1=bore_r,
                     r2=bore_r + ch,
                     center=true);

        // Bottom inner chamfer
        translate([0, 0, -length/2 + ch/2])
            cylinder(h=ch + overlap,
                     r1=bore_r + ch,
                     r2=bore_r,
                     center=true);
    }
}

// Final model
module linear_bearing() {
    difference() {
        outer_body();
        bore_cut();
        inner_edge_chamfers();
    }
}

linear_bearing();
